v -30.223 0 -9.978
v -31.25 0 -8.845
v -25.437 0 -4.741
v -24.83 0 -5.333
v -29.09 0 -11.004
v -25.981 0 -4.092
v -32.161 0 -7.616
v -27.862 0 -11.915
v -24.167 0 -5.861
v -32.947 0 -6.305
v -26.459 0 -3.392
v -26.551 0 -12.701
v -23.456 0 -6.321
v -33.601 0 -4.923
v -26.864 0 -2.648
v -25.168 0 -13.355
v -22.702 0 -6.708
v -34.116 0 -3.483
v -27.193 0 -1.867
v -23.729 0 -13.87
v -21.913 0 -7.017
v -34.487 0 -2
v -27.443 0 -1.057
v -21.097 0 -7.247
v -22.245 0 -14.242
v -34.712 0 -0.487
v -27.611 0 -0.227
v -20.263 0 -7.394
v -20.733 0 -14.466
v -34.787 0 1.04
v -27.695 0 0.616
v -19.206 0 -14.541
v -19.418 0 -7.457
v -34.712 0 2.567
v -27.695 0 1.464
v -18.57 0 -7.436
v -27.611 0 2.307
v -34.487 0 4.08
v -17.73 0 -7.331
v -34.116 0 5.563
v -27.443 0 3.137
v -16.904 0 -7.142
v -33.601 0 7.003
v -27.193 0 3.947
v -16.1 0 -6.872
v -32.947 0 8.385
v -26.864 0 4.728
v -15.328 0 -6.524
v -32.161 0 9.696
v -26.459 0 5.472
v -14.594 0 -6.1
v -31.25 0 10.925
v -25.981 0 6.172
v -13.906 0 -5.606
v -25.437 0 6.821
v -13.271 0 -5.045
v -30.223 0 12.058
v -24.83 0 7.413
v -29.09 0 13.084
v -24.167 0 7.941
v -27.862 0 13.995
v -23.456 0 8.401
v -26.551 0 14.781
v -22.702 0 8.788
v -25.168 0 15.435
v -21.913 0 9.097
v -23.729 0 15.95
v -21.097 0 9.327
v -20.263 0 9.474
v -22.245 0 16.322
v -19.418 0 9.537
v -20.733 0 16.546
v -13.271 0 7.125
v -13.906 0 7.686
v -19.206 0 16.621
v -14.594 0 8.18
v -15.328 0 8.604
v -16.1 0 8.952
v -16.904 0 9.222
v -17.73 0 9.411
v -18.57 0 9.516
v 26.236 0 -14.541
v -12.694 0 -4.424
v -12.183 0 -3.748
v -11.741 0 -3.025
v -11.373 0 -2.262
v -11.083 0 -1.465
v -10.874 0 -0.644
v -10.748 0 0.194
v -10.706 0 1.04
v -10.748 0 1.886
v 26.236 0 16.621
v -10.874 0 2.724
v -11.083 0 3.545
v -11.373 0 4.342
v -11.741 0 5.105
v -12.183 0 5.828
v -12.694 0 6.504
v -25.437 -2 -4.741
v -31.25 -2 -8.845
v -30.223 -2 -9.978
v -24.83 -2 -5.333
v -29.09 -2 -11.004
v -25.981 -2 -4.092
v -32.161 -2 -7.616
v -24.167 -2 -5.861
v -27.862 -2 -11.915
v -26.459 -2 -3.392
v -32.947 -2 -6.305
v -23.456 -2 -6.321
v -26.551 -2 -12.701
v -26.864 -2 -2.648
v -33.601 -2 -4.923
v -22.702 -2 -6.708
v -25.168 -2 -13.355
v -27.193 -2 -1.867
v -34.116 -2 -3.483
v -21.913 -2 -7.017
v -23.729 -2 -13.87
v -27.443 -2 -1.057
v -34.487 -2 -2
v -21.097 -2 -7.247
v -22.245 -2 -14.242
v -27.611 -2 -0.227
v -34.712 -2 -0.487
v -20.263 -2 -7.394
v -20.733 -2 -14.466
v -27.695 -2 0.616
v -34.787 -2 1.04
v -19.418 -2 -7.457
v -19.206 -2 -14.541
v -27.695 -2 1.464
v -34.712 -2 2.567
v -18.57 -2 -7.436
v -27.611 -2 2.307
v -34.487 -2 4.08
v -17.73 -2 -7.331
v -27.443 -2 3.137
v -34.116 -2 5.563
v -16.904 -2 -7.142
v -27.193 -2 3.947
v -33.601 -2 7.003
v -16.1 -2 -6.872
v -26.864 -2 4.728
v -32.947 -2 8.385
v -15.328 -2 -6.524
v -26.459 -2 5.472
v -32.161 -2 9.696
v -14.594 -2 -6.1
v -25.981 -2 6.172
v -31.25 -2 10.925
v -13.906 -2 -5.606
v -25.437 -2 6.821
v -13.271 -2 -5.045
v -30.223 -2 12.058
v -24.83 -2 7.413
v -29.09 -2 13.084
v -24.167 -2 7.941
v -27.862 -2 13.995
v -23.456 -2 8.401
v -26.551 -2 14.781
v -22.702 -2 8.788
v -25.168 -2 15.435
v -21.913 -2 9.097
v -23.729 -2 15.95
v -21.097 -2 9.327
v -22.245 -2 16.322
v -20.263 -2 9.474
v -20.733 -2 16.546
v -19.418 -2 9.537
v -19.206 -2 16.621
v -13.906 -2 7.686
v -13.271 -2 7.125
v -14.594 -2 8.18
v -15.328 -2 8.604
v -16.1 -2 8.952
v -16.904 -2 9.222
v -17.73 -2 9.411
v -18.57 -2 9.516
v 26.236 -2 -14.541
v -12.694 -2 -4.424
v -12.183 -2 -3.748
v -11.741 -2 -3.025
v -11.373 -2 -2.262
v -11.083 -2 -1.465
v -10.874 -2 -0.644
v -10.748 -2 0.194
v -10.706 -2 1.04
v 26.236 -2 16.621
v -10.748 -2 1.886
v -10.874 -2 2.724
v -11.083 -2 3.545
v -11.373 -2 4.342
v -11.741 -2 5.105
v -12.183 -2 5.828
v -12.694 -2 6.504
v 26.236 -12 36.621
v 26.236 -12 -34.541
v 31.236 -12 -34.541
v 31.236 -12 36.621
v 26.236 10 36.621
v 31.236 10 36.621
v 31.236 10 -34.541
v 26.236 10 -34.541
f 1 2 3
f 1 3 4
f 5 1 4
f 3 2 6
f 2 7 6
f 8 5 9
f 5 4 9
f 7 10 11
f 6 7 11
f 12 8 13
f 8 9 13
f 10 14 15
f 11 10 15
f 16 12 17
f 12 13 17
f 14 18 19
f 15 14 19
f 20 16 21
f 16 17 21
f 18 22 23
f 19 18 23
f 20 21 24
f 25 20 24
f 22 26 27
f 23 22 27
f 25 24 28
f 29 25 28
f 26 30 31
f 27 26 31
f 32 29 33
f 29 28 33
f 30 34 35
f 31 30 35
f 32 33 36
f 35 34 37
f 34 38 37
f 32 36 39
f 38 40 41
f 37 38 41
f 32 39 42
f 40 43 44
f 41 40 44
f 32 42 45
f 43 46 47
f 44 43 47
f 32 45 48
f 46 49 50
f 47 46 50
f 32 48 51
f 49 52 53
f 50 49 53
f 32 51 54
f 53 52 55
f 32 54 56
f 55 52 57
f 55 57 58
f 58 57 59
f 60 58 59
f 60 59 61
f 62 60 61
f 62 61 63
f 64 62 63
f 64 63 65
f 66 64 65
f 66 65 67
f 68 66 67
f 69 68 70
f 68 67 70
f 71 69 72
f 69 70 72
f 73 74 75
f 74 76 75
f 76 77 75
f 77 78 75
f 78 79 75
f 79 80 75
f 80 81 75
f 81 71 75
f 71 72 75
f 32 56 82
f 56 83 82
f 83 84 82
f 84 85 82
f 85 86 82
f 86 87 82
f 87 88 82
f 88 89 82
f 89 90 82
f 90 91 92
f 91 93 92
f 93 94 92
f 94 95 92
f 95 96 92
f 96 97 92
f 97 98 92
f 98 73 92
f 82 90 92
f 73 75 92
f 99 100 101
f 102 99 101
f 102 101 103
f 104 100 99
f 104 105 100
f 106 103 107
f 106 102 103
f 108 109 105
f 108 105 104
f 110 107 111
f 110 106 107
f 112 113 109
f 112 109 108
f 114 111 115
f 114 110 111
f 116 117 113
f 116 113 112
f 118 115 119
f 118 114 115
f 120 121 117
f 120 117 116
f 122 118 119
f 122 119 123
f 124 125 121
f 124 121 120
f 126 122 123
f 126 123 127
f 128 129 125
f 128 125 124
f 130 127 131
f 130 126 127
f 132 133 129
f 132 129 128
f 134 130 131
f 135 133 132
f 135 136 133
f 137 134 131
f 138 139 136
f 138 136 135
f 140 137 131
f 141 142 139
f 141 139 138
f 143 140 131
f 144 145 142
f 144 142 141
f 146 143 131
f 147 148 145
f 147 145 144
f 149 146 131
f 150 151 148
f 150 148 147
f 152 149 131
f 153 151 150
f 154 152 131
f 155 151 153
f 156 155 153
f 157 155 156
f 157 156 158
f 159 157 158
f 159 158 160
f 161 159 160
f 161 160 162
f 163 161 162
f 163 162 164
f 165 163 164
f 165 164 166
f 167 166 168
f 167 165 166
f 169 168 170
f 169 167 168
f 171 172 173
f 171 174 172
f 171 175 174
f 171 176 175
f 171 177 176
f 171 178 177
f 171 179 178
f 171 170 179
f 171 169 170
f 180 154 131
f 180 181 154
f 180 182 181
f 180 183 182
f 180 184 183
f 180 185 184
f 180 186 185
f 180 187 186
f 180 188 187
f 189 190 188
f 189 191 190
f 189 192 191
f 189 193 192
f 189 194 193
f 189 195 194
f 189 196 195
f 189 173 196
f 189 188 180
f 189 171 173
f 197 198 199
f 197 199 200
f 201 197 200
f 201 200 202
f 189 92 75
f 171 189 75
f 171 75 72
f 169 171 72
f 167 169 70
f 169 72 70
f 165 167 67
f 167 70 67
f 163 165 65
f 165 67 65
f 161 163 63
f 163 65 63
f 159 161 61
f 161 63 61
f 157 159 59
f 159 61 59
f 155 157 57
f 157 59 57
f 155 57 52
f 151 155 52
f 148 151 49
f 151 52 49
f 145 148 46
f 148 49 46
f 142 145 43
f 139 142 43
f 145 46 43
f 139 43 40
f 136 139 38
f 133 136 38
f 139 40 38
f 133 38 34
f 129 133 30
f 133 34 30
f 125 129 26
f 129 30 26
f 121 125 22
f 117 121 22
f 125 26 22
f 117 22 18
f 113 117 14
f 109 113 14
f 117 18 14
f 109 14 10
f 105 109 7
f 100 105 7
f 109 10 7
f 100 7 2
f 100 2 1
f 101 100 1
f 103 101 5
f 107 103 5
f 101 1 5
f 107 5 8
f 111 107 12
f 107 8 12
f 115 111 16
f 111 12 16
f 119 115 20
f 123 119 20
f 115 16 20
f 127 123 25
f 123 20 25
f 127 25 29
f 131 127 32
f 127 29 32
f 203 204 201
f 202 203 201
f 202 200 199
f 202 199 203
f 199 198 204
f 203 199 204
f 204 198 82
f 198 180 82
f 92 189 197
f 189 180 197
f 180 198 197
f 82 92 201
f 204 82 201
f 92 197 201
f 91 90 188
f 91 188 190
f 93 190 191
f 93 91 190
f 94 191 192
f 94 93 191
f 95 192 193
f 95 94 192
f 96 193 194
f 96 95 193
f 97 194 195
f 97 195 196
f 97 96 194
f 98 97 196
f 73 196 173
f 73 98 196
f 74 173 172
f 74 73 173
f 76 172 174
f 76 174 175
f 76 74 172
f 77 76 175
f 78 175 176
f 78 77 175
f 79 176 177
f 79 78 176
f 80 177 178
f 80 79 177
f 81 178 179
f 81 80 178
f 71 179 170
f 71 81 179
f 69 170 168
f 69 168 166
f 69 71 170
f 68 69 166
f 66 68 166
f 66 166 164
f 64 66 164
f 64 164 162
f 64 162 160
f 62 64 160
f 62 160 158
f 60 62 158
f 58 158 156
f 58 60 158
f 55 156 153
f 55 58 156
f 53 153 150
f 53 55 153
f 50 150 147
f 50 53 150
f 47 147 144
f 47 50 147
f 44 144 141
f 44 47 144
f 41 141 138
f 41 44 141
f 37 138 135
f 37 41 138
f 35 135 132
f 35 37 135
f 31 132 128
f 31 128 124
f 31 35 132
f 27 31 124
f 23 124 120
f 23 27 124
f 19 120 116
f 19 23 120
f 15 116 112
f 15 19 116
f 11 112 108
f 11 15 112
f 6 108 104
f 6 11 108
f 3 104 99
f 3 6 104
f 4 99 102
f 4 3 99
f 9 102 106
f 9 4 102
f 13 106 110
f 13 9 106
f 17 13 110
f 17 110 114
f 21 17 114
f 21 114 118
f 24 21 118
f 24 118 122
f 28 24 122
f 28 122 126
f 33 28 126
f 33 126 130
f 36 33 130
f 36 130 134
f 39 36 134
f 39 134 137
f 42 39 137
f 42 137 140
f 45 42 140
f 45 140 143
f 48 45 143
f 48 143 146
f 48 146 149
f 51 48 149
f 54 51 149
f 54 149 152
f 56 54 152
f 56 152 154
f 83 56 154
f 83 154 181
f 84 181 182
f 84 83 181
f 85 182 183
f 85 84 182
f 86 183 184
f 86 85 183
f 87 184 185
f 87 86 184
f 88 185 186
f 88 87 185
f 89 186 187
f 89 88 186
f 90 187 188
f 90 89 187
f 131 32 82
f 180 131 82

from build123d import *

# Parameters (mm, degrees)
F0_R     = 8.5
F1_DEPTH = 2
F2_W     = 22
F2_H     = 71.162369
F3_DEPTH = 5


with BuildPart() as f1:
    # F0 (on Front) → F1 (new body)
    with BuildSketch(Plane.XZ):
        with BuildLine():
            Line((26.236077, 16.621207), (-19.205651, 16.621207))
            ThreePointArc((-19.205651, 16.621207), (-34.786835, 1.040022), (-19.205651, -14.541162))
            Line((-19.205651, -14.541162), (26.236077, -14.541162))
            Line((26.236077, -14.541162), (26.236077, 16.621207))
        make_face()
        with Locations((-19.205651, 1.040022)):
            Circle(F0_R, mode=Mode.SUBTRACT)
    extrude(amount=F1_DEPTH)

    # F2 (on face) → F3 (join)
    with BuildSketch(Plane.YZ.offset(26.236077)):
        with Locations((-1, 1.040022)):
            Rectangle(F2_W, F2_H)
    extrude(amount=F3_DEPTH)


solid = f1.part
